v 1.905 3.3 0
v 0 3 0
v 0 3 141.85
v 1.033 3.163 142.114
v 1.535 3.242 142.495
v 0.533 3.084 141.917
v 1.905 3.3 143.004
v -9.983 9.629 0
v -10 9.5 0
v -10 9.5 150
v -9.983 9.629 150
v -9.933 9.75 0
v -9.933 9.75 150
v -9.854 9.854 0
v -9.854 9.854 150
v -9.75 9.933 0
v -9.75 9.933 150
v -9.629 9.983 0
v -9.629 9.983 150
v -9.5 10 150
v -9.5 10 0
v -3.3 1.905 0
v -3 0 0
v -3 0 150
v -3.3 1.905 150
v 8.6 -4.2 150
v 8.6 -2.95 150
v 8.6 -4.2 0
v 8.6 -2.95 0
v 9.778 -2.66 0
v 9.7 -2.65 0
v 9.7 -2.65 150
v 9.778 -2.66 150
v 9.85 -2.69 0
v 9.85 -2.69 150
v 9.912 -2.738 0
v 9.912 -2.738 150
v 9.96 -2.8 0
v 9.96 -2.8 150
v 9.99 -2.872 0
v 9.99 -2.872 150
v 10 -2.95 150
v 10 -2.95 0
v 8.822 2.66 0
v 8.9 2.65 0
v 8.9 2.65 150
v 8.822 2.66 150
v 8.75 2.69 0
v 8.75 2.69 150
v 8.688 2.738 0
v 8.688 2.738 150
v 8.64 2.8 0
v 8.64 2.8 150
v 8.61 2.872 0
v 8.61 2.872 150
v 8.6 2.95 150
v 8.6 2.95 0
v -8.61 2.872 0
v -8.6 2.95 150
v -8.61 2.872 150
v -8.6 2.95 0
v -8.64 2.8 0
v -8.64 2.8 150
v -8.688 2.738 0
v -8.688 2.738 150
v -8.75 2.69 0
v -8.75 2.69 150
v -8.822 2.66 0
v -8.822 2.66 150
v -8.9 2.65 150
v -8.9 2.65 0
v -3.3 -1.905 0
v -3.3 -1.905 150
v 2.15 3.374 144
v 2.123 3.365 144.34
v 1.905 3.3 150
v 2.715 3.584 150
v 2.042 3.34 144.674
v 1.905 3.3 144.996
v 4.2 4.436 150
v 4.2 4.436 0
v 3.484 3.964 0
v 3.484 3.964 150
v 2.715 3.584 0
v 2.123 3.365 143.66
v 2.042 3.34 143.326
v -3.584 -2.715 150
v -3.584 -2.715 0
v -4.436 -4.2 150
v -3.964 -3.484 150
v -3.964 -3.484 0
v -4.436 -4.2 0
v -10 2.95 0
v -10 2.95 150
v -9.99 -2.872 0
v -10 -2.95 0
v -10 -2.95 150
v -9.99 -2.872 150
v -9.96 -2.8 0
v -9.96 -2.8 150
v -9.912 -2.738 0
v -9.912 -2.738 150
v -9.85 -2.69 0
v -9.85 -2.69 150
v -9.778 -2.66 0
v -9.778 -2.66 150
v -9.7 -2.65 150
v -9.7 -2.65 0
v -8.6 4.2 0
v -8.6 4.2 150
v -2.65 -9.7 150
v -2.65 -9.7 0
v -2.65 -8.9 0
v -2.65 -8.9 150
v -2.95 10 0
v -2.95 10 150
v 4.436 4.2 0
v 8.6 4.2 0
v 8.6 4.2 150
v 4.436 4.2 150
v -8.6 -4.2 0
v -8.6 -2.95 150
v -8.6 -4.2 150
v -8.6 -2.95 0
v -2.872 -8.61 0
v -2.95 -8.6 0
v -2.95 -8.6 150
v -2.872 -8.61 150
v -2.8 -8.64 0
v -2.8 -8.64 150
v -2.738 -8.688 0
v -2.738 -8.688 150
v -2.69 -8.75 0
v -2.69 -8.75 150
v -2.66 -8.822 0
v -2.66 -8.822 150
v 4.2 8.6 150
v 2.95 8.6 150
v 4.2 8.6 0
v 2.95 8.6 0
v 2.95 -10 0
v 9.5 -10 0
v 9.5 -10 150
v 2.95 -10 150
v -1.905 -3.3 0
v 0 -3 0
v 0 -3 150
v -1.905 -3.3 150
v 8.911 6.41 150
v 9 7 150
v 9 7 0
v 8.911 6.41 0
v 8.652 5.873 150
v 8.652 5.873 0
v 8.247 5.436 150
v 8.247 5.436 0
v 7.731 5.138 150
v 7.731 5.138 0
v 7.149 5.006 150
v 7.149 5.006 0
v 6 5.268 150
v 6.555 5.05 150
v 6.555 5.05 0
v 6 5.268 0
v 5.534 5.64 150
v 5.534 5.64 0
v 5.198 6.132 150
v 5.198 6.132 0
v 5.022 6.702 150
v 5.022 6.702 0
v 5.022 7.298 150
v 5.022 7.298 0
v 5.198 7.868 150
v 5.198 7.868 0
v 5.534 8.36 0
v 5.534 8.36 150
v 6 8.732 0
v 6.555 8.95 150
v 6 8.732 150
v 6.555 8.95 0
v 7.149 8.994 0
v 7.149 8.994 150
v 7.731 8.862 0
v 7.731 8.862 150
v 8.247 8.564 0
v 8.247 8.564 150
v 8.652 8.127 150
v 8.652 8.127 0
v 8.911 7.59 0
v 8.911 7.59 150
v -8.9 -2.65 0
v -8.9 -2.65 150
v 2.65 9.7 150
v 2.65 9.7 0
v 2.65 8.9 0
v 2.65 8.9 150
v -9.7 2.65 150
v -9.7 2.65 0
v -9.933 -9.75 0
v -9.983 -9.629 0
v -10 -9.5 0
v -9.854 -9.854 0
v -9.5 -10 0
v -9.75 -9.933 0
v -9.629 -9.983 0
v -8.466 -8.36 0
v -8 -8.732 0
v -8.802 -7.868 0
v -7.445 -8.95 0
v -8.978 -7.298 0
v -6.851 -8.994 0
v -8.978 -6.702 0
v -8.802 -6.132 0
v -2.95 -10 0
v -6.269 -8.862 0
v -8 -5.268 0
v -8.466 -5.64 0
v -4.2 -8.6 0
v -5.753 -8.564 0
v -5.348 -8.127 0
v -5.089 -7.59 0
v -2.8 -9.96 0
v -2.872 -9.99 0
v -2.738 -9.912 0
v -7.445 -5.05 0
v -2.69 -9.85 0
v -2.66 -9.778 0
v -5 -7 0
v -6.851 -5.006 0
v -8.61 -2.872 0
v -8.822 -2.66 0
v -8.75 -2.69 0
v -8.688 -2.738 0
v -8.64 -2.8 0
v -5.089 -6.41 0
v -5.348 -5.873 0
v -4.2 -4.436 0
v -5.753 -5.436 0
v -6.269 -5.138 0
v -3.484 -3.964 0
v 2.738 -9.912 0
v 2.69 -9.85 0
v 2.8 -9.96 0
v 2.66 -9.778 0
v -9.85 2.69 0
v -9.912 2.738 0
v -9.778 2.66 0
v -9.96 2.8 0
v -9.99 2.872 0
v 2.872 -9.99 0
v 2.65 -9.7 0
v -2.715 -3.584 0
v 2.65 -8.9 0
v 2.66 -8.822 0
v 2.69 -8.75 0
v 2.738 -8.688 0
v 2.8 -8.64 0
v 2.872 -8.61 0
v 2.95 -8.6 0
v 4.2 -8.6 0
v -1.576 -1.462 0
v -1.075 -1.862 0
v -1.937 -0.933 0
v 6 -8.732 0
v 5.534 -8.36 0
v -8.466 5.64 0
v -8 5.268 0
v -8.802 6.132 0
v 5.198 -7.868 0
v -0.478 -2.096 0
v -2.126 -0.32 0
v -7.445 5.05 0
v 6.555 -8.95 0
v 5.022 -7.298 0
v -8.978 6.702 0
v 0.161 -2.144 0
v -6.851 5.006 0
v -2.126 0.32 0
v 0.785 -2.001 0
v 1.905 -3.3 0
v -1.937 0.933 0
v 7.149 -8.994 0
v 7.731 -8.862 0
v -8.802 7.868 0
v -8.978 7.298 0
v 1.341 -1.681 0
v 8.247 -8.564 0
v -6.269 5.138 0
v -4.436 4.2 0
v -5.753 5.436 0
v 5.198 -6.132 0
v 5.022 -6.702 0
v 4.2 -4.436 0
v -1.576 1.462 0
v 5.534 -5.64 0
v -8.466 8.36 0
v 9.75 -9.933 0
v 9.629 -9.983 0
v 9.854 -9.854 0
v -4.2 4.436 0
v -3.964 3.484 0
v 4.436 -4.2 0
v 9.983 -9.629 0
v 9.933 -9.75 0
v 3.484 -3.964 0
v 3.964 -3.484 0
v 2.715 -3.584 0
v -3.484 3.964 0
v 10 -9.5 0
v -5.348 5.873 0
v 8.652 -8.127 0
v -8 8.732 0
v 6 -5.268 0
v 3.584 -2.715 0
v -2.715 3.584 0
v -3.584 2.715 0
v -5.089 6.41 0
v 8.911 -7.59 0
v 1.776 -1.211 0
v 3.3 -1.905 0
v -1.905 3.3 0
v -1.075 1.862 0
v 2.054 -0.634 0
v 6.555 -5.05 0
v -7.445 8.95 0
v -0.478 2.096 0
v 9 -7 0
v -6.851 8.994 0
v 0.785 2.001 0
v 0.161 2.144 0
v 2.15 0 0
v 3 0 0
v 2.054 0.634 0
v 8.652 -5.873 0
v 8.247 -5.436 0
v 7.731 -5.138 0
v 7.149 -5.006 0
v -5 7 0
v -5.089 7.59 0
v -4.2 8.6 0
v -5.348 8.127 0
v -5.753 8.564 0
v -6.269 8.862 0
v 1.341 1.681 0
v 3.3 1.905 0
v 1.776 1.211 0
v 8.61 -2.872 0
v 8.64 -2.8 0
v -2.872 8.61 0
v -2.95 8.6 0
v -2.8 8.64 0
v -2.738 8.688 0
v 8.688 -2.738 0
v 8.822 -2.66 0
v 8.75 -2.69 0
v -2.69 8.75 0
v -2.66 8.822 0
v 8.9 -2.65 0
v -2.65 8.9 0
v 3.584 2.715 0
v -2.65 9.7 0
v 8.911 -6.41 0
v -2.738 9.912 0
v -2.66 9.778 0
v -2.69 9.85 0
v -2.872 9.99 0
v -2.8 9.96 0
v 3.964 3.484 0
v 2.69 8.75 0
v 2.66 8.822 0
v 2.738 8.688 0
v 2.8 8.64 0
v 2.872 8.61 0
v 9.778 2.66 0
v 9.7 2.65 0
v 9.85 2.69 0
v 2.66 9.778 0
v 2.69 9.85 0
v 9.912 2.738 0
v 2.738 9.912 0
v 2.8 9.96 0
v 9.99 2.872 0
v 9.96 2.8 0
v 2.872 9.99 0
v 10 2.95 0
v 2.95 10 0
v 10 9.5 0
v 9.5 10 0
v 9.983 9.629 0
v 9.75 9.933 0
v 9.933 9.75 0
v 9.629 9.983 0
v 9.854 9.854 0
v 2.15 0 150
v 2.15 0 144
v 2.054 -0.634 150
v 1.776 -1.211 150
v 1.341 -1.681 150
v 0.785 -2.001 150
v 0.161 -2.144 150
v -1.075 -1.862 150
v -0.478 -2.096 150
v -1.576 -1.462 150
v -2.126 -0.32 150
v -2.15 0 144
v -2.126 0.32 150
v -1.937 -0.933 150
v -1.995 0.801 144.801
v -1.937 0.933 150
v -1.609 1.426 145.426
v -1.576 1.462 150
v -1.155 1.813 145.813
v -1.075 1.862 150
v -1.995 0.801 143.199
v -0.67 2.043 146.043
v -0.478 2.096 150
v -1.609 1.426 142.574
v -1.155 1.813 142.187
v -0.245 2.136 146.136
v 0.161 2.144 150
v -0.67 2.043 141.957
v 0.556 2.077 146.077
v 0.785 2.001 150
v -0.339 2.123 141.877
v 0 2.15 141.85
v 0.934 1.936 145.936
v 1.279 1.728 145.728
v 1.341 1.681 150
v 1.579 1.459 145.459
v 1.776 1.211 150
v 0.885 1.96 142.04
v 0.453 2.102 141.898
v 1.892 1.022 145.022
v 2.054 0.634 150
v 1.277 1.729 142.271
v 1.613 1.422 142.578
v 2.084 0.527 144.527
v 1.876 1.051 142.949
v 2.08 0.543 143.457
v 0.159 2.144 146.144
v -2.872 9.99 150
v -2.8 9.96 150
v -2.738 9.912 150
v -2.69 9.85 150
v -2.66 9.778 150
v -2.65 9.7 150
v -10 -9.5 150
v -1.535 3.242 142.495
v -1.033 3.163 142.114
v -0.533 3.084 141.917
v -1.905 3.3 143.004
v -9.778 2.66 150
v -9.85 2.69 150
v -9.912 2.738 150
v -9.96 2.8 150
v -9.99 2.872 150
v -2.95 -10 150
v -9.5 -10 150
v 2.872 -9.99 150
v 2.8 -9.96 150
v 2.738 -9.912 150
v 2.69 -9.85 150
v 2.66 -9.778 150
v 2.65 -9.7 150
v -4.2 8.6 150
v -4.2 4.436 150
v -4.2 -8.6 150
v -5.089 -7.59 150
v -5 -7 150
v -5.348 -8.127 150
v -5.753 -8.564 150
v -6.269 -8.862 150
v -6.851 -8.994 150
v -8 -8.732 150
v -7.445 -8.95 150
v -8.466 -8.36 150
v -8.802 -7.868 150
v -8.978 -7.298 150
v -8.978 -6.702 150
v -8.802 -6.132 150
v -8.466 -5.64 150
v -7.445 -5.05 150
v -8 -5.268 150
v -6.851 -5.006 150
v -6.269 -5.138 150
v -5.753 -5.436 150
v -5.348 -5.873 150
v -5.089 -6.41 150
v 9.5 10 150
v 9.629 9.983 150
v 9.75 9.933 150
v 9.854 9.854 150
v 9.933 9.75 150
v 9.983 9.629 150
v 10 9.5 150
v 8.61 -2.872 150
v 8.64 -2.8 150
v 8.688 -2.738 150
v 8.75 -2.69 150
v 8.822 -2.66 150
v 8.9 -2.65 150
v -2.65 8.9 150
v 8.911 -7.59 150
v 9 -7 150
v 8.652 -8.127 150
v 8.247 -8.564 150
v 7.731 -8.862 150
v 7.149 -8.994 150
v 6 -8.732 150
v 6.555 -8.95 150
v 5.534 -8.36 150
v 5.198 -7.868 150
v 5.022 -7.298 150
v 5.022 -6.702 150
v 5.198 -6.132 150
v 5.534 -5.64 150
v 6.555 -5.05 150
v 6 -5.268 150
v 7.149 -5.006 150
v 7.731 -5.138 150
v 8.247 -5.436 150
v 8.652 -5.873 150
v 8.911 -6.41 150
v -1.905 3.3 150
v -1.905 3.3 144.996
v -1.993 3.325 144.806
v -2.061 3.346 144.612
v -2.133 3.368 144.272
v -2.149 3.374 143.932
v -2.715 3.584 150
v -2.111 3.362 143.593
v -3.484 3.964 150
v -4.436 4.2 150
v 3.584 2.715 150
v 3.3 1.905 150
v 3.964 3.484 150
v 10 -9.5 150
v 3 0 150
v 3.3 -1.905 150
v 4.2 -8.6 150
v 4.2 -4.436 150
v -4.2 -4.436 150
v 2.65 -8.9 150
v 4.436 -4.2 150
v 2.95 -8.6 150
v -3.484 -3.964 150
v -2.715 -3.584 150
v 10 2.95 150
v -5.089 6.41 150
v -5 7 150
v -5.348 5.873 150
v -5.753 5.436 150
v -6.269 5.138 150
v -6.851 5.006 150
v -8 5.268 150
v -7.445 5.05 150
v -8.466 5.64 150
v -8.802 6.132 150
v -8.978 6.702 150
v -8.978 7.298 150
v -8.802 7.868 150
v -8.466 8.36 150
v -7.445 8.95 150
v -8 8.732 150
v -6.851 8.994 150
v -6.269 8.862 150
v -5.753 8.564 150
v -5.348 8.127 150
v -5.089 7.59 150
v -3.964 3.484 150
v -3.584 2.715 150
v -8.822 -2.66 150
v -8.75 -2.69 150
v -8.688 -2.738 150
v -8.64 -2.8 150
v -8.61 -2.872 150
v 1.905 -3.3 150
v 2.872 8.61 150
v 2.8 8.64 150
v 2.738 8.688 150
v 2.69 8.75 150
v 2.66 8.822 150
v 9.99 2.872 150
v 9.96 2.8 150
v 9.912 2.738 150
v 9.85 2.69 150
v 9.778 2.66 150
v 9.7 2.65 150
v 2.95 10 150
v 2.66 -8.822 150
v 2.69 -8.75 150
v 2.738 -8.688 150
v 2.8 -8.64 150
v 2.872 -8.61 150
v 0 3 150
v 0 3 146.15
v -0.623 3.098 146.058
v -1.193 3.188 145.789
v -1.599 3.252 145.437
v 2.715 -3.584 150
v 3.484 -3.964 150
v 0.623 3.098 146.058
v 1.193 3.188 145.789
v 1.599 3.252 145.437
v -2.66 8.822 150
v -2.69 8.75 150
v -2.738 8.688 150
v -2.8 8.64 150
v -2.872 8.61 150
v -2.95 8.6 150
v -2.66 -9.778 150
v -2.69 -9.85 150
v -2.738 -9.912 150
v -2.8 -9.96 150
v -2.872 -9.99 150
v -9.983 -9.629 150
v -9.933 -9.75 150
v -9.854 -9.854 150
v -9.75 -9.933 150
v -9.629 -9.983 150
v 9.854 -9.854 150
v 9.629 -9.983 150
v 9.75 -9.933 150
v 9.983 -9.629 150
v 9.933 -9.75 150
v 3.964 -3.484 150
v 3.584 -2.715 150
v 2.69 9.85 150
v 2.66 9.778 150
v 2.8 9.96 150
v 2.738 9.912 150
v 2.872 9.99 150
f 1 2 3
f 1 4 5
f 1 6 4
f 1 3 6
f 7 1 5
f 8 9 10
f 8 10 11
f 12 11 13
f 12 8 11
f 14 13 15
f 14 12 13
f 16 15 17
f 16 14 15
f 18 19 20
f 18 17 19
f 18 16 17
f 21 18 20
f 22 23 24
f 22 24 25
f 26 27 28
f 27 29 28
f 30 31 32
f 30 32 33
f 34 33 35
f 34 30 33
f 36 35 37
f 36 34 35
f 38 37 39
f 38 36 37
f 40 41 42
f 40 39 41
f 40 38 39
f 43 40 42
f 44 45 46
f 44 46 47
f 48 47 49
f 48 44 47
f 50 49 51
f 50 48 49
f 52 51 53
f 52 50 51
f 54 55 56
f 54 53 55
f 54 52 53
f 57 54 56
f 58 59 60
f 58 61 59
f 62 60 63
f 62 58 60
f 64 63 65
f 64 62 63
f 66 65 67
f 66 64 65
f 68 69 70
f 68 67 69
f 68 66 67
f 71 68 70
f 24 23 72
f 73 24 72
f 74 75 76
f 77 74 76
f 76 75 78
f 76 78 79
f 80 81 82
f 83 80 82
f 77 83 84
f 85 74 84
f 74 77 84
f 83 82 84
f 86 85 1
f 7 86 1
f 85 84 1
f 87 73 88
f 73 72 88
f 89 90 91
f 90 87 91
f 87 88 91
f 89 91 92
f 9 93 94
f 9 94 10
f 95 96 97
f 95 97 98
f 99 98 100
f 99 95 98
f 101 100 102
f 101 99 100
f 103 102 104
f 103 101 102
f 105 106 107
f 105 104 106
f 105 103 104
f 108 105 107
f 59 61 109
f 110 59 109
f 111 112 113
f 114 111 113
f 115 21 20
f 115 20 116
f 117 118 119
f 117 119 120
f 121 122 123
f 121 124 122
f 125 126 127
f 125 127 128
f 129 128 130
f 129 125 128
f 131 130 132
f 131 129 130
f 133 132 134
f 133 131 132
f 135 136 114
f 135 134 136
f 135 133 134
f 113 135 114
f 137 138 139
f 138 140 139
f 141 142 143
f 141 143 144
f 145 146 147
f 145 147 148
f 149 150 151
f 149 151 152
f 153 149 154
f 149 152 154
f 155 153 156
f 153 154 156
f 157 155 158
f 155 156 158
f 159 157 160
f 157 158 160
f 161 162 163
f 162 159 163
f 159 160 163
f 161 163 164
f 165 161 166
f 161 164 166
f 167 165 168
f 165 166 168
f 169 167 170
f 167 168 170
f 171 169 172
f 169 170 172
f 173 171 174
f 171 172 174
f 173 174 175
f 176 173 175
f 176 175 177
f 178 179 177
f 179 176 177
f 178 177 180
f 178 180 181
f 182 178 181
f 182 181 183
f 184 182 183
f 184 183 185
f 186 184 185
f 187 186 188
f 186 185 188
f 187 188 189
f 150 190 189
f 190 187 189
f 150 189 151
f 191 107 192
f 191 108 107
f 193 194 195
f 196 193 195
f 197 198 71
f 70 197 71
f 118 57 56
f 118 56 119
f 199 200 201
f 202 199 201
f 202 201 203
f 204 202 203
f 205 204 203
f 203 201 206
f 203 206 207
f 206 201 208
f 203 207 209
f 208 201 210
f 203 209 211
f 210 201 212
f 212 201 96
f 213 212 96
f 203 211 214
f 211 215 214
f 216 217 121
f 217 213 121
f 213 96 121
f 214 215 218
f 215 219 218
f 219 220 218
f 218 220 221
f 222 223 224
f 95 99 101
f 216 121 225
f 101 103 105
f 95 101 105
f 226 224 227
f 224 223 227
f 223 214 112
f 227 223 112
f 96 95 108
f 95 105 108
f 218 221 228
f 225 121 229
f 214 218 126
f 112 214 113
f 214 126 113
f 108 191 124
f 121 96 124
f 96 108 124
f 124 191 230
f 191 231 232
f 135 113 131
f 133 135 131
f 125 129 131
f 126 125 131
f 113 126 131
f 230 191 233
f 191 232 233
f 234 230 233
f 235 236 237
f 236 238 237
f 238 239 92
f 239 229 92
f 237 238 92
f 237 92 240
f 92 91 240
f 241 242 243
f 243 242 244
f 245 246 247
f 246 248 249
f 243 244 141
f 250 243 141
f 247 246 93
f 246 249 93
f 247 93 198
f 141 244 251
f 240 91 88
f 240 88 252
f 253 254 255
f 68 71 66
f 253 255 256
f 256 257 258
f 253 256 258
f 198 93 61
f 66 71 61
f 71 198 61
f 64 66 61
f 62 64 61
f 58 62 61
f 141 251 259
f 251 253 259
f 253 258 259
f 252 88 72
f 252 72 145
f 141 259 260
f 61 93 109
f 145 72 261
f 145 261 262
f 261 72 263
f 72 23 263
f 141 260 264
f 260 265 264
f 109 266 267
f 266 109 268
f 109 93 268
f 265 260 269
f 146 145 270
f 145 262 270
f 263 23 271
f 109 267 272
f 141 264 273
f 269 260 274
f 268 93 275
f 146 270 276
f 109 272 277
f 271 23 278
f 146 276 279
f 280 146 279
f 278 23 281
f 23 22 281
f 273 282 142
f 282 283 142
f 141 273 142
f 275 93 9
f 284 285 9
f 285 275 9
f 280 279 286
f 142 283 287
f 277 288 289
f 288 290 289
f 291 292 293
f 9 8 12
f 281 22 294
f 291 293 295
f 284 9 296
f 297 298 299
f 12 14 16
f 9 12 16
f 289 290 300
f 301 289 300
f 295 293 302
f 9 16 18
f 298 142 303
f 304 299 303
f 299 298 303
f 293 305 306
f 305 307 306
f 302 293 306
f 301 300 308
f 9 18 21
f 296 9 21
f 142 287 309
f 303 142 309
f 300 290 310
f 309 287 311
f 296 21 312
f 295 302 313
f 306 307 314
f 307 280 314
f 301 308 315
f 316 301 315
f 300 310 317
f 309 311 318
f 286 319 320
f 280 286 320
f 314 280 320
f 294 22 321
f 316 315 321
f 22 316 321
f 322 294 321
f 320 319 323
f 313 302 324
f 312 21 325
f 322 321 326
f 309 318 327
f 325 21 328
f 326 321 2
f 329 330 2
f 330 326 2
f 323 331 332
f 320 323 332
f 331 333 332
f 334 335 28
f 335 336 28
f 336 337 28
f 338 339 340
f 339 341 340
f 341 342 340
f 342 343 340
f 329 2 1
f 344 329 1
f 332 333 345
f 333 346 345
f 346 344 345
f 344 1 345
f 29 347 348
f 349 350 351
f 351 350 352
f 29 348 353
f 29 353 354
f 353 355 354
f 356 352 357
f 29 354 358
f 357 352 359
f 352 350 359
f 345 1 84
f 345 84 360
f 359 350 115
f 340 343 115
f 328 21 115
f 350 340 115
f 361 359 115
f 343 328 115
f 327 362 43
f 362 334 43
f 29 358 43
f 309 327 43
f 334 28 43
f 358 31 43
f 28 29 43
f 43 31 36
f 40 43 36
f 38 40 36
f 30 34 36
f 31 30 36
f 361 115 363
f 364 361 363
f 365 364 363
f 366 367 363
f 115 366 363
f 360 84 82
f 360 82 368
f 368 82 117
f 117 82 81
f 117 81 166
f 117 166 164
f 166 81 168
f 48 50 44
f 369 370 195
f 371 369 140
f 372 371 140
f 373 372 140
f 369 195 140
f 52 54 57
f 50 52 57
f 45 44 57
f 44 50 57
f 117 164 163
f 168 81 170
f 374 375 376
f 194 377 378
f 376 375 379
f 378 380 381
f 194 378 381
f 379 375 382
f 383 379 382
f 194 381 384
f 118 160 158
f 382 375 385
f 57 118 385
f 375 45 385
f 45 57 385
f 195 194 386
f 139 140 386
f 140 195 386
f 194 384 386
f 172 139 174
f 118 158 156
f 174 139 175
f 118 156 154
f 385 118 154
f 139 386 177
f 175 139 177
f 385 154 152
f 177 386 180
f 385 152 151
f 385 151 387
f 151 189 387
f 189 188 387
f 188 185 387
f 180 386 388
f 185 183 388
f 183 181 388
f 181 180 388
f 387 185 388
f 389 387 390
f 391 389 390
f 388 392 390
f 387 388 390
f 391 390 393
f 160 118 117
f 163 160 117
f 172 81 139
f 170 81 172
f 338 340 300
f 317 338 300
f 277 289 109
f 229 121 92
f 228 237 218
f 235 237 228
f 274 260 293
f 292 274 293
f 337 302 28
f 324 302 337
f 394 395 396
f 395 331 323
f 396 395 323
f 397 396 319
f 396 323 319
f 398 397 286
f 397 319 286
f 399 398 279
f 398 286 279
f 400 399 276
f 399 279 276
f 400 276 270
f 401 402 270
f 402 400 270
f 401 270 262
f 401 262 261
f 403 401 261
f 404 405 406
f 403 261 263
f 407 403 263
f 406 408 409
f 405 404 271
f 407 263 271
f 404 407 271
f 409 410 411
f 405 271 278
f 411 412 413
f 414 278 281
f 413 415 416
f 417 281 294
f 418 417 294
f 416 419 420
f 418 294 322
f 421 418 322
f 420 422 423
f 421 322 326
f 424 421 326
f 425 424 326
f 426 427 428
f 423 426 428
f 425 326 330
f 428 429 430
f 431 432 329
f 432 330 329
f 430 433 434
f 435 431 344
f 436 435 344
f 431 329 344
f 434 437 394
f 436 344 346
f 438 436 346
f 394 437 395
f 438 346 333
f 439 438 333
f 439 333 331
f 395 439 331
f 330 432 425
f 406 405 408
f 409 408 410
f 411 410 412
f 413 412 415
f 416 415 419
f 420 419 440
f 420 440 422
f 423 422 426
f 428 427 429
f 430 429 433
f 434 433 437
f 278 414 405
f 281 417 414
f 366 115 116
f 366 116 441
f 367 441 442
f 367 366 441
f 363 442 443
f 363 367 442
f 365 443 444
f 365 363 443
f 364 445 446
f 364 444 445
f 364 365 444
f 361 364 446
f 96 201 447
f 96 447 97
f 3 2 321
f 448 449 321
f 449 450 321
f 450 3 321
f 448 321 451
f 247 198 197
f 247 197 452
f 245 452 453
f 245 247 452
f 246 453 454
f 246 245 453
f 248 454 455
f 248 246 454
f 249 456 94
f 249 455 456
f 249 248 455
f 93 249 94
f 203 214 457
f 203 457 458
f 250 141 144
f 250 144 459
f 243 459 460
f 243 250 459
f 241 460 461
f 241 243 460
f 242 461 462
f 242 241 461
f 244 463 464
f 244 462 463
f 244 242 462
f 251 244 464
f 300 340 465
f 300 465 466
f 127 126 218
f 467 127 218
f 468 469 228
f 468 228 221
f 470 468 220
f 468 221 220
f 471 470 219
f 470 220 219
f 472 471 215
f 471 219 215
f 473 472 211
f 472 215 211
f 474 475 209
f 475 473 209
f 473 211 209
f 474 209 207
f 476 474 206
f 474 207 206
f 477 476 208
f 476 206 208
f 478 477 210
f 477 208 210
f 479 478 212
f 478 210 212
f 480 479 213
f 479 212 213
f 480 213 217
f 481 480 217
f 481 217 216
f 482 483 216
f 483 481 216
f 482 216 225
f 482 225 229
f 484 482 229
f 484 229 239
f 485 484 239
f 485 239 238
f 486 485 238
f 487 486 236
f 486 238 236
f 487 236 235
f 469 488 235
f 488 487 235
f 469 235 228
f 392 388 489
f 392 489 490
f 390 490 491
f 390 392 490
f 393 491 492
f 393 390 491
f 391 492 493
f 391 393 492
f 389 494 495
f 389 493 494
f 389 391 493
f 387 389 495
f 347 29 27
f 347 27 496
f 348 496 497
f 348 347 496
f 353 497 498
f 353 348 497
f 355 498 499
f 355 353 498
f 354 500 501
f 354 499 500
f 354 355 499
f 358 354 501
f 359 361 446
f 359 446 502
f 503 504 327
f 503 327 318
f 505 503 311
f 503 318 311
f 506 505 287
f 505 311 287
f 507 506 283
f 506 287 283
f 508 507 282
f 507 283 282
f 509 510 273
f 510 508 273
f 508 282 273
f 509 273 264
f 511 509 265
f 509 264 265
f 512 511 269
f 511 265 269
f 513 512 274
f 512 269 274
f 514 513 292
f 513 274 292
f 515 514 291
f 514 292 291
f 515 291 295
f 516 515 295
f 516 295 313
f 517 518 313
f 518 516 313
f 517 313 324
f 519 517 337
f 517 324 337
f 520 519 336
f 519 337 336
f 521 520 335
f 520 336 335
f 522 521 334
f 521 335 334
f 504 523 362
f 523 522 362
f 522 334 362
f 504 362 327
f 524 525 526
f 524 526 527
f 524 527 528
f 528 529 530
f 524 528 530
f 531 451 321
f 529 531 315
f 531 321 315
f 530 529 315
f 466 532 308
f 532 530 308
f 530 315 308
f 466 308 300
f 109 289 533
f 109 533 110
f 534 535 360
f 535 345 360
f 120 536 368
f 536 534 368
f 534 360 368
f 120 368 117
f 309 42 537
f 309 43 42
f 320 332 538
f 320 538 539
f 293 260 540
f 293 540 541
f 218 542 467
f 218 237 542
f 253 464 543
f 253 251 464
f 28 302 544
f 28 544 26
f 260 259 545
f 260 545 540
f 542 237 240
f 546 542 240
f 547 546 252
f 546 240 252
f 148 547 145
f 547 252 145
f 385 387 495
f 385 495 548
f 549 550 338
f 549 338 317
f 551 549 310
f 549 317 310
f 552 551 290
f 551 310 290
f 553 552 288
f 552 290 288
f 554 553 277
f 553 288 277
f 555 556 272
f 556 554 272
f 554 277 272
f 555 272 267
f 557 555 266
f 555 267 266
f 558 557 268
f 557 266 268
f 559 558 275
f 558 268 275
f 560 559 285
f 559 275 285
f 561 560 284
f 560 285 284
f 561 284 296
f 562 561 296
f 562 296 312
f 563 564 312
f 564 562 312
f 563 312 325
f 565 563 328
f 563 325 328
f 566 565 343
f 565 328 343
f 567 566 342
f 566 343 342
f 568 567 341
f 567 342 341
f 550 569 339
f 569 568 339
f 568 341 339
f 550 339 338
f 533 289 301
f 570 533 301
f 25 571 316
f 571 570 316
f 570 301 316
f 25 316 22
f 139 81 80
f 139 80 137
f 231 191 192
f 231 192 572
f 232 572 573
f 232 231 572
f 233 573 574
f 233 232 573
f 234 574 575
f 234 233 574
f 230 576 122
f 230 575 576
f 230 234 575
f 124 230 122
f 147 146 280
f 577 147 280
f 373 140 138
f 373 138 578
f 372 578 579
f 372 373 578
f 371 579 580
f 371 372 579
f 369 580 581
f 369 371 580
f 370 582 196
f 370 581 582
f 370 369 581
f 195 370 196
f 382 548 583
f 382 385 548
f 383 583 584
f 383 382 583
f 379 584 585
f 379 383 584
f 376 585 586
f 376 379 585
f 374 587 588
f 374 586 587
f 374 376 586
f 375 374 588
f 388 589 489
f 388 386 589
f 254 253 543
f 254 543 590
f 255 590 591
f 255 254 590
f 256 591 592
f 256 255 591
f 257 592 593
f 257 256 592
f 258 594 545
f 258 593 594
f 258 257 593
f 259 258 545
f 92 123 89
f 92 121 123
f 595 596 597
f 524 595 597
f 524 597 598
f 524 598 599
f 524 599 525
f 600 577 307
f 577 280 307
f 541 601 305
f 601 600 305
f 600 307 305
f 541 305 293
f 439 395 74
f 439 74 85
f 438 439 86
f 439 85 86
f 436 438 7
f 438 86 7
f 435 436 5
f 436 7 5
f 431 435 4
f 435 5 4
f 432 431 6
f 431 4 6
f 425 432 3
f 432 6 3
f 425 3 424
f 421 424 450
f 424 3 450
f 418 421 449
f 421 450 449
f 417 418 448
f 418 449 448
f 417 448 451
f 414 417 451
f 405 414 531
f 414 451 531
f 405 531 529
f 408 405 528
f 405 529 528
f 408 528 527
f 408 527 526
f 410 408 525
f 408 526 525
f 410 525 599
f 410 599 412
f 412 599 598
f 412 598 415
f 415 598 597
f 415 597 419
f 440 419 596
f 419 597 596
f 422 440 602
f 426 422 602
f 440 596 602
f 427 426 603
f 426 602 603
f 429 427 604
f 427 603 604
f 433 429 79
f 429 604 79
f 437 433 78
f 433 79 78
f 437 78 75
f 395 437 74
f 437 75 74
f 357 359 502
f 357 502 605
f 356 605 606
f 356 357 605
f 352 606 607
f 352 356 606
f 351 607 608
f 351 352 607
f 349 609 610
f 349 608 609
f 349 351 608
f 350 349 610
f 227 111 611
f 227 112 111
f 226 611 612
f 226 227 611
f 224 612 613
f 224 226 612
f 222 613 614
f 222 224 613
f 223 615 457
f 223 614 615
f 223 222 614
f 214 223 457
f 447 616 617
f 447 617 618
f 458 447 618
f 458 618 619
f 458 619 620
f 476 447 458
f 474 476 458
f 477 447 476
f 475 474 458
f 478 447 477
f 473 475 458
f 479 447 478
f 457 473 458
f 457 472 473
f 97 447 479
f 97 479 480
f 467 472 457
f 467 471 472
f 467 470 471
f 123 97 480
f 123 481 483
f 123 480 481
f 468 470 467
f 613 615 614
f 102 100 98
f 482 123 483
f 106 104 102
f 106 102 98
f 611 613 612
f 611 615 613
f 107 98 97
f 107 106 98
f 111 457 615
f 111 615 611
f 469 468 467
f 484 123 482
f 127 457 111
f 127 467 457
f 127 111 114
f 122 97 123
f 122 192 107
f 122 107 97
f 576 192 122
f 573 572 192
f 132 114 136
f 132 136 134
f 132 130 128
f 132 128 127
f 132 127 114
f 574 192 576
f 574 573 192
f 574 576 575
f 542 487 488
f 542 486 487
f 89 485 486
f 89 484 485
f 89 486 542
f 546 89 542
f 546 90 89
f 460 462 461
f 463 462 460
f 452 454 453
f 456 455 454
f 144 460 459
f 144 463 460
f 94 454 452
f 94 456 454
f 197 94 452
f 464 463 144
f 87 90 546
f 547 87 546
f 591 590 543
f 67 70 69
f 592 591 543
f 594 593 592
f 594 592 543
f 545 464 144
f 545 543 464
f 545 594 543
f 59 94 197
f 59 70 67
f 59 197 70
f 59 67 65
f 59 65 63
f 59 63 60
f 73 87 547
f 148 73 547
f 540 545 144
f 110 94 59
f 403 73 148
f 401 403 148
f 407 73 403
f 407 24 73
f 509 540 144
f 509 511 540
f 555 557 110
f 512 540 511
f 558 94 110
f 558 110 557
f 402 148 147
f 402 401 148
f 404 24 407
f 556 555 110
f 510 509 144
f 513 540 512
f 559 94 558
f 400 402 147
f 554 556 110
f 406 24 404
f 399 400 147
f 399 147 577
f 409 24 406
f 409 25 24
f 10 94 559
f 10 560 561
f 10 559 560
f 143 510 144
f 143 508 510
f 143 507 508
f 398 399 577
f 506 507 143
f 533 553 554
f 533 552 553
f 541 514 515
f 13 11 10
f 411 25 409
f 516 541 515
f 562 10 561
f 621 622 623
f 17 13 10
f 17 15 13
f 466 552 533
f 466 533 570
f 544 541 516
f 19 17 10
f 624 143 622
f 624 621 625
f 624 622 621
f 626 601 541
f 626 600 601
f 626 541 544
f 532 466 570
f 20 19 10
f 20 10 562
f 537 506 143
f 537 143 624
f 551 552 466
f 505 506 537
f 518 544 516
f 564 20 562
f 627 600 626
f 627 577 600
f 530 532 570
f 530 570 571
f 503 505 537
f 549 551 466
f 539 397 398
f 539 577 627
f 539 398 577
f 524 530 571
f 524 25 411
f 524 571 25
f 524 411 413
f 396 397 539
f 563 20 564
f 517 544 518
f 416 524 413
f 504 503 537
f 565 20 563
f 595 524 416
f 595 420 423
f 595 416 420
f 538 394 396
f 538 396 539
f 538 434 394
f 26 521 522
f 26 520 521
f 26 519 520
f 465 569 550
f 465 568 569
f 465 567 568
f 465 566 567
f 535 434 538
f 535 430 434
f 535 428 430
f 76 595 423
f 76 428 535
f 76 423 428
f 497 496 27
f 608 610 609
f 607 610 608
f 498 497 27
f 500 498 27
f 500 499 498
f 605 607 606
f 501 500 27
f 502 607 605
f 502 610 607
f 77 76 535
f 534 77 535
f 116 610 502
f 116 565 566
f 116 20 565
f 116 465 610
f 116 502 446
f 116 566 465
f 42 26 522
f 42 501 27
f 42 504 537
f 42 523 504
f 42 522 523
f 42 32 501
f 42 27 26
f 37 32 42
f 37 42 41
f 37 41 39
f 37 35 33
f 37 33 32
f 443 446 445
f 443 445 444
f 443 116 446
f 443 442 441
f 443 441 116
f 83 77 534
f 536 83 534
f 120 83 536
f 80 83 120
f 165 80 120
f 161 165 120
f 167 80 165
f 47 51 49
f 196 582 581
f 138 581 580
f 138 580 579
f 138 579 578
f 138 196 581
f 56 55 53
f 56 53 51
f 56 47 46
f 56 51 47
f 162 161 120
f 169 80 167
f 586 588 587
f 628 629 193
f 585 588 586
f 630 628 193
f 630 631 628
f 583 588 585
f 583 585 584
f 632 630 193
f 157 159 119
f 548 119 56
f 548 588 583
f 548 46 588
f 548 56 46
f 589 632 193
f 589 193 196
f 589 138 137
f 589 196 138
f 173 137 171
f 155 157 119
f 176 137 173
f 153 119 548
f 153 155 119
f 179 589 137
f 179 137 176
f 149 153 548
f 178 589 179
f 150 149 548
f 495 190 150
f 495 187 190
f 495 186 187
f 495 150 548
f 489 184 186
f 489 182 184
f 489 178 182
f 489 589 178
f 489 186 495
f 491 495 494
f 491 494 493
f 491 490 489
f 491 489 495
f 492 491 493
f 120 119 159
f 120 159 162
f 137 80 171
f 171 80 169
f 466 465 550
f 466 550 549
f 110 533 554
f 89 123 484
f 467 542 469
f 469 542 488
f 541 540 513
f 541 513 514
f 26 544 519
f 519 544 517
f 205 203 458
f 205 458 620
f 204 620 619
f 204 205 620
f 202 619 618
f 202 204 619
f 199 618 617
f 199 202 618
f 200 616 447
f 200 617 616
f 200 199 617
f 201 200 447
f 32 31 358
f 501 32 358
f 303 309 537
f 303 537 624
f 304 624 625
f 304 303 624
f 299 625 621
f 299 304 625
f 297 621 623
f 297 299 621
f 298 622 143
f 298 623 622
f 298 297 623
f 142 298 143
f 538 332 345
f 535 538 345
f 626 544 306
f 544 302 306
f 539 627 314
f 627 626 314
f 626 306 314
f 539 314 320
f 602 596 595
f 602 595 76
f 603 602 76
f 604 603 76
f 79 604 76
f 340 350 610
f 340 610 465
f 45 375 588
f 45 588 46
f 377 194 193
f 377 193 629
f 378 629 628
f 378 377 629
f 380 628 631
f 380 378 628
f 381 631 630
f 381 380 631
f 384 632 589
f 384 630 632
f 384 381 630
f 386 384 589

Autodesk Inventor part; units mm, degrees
ref_plane "YZ Plane" through (0, 0, 0) normal (1, 0, 0) x (0, 1, 0)
ref_plane "XZ Plane" through (0, 0, 0) normal (0, 1, 0) x (-1, 0, 0)
ref_plane "XY Plane" through (0, 0, 0) normal (0, 0, 1) x (1, 0, 0)
sketch "Sketch1" plane through (0, 0, 0) normal (0, 0, 1) x (1, 0, 0)
  line L0 (0, 0) -> (12.2143, 12.2143) construction
  line L1 (0, 0) -> (10, 0) construction
  circle A0 centre (0, 0) radius 2.15
  circle A1 centre (7, 7) radius 2
  circle A2 centre (-7, 7) radius 2
  circle A3 centre (-7, -7) radius 2
  circle A4 centre (7, -7) radius 2
  line L2 (2.95, 10) -> (9.5, 10)
  line L3 (10, 9.5) -> (10, 2.95)
  line L4 (9.7, 2.65) -> (8.9, 2.65)
  line L5 (8.6, 2.95) -> (8.6, 4.2)
  line L6 (4.2, 4.4357) -> (4.2, 8.6)
  line L7 (2.65, 9.7) -> (2.65, 8.9)
  line L8 (2.95, 8.6) -> (4.2, 8.6)
  line L9 (0, 14.2934) -> (0, -14.2934) construction
  arc A5 (2.95, 10) -> (2.65, 9.7) centre (2.95, 9.7) ccw
  arc A6 (2.65, 8.9) -> (2.95, 8.6) centre (2.95, 8.9) ccw
  arc A7 (8.6, 2.95) -> (8.9, 2.65) centre (8.9, 2.95) ccw
  arc A8 (9.7, 2.65) -> (10, 2.95) centre (9.7, 2.95) ccw
  arc A9 (10, 9.5) -> (9.5, 10) centre (9.5, 9.5) ccw
  circle A10 centre (0, 7.1516) radius 5.0016 construction
  circle A11 centre (7.1516, 0) radius 5.0016 construction
  line L10 (8.6, 4.2) -> (4.4357, 4.2)
  line L11 (0, 3) -> (1.9054, 3.3)
  arc A12 (1.9054, 3.3) -> (4.2, 4.4357) centre (0, 10.0357) ccw
  line L12 (3, 0) -> (3.3, 1.9054)
  arc A13 (4.4357, 4.2) -> (3.3, 1.9054) centre (10.0357, 0) ccw
  line L13 (-3, 0) -> (-3.3, 1.9054)
  arc A14 (-3.3, 1.9054) -> (-4.4357, 4.2) centre (-10.0357, 0) ccw
  arc A15 (-4.2, 4.4357) -> (-1.9054, 3.3) centre (0, 10.0357) ccw
  line L14 (0, 3) -> (-1.9054, 3.3)
  line L15 (-4.4357, 4.2) -> (-8.6, 4.2)
  line L16 (-8.6, 2.95) -> (-8.6, 4.2)
  arc A16 (-8.9, 2.65) -> (-8.6, 2.95) centre (-8.9, 2.95) ccw
  line L17 (-9.7, 2.65) -> (-8.9, 2.65)
  arc A17 (-10, 2.95) -> (-9.7, 2.65) centre (-9.7, 2.95) ccw
  line L18 (-10, 2.95) -> (-10, 9.5)
  arc A18 (-9.5, 10) -> (-10, 9.5) centre (-9.5, 9.5) ccw
  line L19 (-9.5, 10) -> (-2.95, 10)
  line L20 (-4.2, 8.6) -> (-4.2, 4.4357)
  line L21 (-2.95, 8.6) -> (-4.2, 8.6)
  arc A19 (-2.95, 8.6) -> (-2.65, 8.9) centre (-2.95, 8.9) ccw
  line L22 (-2.65, 9.7) -> (-2.65, 8.9)
  arc A20 (-2.65, 9.7) -> (-2.95, 10) centre (-2.95, 9.7) ccw
  line L23 (0, -3) -> (-1.9054, -3.3)
  arc A21 (-1.9054, -3.3) -> (-4.2, -4.4357) centre (0, -10.0357) ccw
  arc A22 (-4.4357, -4.2) -> (-3.3, -1.9054) centre (-10.0357, 0) ccw
  line L24 (-3, 0) -> (-3.3, -1.9054)
  line L25 (-4.2, -4.4357) -> (-4.2, -8.6)
  line L26 (-2.95, -8.6) -> (-4.2, -8.6)
  arc A23 (-2.65, -8.9) -> (-2.95, -8.6) centre (-2.95, -8.9) ccw
  line L27 (-2.65, -9.7) -> (-2.65, -8.9)
  arc A24 (-2.95, -10) -> (-2.65, -9.7) centre (-2.95, -9.7) ccw
  line L28 (-2.95, -10) -> (-9.5, -10)
  arc A25 (-10, -9.5) -> (-9.5, -10) centre (-9.5, -9.5) ccw
  line L29 (-10, -9.5) -> (-10, -2.95)
  line L30 (-8.6, -4.2) -> (-4.4357, -4.2)
  line L31 (-8.6, -2.95) -> (-8.6, -4.2)
  arc A26 (-8.6, -2.95) -> (-8.9, -2.65) centre (-8.9, -2.95) ccw
  line L32 (-9.7, -2.65) -> (-8.9, -2.65)
  arc A27 (-9.7, -2.65) -> (-10, -2.95) centre (-9.7, -2.95) ccw
  line L33 (3, 0) -> (3.3, -1.9054)
  arc A28 (3.3, -1.9054) -> (4.4357, -4.2) centre (10.0357, 0) ccw
  arc A29 (4.2, -4.4357) -> (1.9054, -3.3) centre (0, -10.0357) ccw
  line L34 (0, -3) -> (1.9054, -3.3)
  line L35 (4.4357, -4.2) -> (8.6, -4.2)
  line L36 (8.6, -2.95) -> (8.6, -4.2)
  arc A30 (8.9, -2.65) -> (8.6, -2.95) centre (8.9, -2.95) ccw
  line L37 (9.7, -2.65) -> (8.9, -2.65)
  arc A31 (10, -2.95) -> (9.7, -2.65) centre (9.7, -2.95) ccw
  line L38 (10, -2.95) -> (10, -9.5)
  arc A32 (9.5, -10) -> (10, -9.5) centre (9.5, -9.5) ccw
  line L39 (9.5, -10) -> (2.95, -10)
  line L40 (4.2, -8.6) -> (4.2, -4.4357)
  line L41 (2.95, -8.6) -> (4.2, -8.6)
  arc A33 (2.95, -8.6) -> (2.65, -8.9) centre (2.95, -8.9) ccw
  line L42 (2.65, -9.7) -> (2.65, -8.9)
  arc A34 (2.65, -9.7) -> (2.95, -10) centre (2.95, -9.7) ccw
  point P0 (10, 2.65)
  point P1 (8.6, 2.65)
  point P2 (-2.65, 10)
  point P3 (-2.65, 8.6)
  point P4 (-10, -2.65)
  point P5 (-8.6, -2.65)
  point P6 (2.65, -10)
  point P7 (2.65, -8.6)
  dimension "d1" = 45
  dimension "d2" = 4.3
  dimension "d3" = 4
  dimension "d6" = 360
  dimension "d9" = 2.65
  dimension "d10" = 4.2
  dimension "d11" = 1.4
  dimension "d12" = 7
  dimension "d13" = 10
  dimension "d14" = 10
  dimension "d15" = 1.4
  dimension "d16" = 2.65
  dimension "d18" = 0.3
  dimension "d19" = 0.5
  dimension "d22" = 4.2
  dimension "d24" = 6.7
  dimension "d25" = 0.3
  dimension "d26" = 7
  dimension "d27" = 6.7
  dimension "d28" = 0.3
  dimension "d29" = 7
  dimension "d32" = 360
extrude "Extrusion1" add sketch "Sketch1" along normal blind 150
sketch "Sketch2" plane through (2.95, 10, 150) normal (0, 1, 0) x (1, 0, 0)
  line L0 (-2.95, 150) -> (-2.95, 0) projected
  circle A0 centre (-2.95, 6) radius 2.15
  dimension "d36" = 4.3
  dimension "d37" = 6
extrude "Extrusion2" cut sketch "Sketch2" against normal blind 10
ref_plane "Work Plane1" through (0, 0, 75) normal (0, 0, 1) x (1, 0, 0)
properties part number "Aluminum_Profile_2020"
